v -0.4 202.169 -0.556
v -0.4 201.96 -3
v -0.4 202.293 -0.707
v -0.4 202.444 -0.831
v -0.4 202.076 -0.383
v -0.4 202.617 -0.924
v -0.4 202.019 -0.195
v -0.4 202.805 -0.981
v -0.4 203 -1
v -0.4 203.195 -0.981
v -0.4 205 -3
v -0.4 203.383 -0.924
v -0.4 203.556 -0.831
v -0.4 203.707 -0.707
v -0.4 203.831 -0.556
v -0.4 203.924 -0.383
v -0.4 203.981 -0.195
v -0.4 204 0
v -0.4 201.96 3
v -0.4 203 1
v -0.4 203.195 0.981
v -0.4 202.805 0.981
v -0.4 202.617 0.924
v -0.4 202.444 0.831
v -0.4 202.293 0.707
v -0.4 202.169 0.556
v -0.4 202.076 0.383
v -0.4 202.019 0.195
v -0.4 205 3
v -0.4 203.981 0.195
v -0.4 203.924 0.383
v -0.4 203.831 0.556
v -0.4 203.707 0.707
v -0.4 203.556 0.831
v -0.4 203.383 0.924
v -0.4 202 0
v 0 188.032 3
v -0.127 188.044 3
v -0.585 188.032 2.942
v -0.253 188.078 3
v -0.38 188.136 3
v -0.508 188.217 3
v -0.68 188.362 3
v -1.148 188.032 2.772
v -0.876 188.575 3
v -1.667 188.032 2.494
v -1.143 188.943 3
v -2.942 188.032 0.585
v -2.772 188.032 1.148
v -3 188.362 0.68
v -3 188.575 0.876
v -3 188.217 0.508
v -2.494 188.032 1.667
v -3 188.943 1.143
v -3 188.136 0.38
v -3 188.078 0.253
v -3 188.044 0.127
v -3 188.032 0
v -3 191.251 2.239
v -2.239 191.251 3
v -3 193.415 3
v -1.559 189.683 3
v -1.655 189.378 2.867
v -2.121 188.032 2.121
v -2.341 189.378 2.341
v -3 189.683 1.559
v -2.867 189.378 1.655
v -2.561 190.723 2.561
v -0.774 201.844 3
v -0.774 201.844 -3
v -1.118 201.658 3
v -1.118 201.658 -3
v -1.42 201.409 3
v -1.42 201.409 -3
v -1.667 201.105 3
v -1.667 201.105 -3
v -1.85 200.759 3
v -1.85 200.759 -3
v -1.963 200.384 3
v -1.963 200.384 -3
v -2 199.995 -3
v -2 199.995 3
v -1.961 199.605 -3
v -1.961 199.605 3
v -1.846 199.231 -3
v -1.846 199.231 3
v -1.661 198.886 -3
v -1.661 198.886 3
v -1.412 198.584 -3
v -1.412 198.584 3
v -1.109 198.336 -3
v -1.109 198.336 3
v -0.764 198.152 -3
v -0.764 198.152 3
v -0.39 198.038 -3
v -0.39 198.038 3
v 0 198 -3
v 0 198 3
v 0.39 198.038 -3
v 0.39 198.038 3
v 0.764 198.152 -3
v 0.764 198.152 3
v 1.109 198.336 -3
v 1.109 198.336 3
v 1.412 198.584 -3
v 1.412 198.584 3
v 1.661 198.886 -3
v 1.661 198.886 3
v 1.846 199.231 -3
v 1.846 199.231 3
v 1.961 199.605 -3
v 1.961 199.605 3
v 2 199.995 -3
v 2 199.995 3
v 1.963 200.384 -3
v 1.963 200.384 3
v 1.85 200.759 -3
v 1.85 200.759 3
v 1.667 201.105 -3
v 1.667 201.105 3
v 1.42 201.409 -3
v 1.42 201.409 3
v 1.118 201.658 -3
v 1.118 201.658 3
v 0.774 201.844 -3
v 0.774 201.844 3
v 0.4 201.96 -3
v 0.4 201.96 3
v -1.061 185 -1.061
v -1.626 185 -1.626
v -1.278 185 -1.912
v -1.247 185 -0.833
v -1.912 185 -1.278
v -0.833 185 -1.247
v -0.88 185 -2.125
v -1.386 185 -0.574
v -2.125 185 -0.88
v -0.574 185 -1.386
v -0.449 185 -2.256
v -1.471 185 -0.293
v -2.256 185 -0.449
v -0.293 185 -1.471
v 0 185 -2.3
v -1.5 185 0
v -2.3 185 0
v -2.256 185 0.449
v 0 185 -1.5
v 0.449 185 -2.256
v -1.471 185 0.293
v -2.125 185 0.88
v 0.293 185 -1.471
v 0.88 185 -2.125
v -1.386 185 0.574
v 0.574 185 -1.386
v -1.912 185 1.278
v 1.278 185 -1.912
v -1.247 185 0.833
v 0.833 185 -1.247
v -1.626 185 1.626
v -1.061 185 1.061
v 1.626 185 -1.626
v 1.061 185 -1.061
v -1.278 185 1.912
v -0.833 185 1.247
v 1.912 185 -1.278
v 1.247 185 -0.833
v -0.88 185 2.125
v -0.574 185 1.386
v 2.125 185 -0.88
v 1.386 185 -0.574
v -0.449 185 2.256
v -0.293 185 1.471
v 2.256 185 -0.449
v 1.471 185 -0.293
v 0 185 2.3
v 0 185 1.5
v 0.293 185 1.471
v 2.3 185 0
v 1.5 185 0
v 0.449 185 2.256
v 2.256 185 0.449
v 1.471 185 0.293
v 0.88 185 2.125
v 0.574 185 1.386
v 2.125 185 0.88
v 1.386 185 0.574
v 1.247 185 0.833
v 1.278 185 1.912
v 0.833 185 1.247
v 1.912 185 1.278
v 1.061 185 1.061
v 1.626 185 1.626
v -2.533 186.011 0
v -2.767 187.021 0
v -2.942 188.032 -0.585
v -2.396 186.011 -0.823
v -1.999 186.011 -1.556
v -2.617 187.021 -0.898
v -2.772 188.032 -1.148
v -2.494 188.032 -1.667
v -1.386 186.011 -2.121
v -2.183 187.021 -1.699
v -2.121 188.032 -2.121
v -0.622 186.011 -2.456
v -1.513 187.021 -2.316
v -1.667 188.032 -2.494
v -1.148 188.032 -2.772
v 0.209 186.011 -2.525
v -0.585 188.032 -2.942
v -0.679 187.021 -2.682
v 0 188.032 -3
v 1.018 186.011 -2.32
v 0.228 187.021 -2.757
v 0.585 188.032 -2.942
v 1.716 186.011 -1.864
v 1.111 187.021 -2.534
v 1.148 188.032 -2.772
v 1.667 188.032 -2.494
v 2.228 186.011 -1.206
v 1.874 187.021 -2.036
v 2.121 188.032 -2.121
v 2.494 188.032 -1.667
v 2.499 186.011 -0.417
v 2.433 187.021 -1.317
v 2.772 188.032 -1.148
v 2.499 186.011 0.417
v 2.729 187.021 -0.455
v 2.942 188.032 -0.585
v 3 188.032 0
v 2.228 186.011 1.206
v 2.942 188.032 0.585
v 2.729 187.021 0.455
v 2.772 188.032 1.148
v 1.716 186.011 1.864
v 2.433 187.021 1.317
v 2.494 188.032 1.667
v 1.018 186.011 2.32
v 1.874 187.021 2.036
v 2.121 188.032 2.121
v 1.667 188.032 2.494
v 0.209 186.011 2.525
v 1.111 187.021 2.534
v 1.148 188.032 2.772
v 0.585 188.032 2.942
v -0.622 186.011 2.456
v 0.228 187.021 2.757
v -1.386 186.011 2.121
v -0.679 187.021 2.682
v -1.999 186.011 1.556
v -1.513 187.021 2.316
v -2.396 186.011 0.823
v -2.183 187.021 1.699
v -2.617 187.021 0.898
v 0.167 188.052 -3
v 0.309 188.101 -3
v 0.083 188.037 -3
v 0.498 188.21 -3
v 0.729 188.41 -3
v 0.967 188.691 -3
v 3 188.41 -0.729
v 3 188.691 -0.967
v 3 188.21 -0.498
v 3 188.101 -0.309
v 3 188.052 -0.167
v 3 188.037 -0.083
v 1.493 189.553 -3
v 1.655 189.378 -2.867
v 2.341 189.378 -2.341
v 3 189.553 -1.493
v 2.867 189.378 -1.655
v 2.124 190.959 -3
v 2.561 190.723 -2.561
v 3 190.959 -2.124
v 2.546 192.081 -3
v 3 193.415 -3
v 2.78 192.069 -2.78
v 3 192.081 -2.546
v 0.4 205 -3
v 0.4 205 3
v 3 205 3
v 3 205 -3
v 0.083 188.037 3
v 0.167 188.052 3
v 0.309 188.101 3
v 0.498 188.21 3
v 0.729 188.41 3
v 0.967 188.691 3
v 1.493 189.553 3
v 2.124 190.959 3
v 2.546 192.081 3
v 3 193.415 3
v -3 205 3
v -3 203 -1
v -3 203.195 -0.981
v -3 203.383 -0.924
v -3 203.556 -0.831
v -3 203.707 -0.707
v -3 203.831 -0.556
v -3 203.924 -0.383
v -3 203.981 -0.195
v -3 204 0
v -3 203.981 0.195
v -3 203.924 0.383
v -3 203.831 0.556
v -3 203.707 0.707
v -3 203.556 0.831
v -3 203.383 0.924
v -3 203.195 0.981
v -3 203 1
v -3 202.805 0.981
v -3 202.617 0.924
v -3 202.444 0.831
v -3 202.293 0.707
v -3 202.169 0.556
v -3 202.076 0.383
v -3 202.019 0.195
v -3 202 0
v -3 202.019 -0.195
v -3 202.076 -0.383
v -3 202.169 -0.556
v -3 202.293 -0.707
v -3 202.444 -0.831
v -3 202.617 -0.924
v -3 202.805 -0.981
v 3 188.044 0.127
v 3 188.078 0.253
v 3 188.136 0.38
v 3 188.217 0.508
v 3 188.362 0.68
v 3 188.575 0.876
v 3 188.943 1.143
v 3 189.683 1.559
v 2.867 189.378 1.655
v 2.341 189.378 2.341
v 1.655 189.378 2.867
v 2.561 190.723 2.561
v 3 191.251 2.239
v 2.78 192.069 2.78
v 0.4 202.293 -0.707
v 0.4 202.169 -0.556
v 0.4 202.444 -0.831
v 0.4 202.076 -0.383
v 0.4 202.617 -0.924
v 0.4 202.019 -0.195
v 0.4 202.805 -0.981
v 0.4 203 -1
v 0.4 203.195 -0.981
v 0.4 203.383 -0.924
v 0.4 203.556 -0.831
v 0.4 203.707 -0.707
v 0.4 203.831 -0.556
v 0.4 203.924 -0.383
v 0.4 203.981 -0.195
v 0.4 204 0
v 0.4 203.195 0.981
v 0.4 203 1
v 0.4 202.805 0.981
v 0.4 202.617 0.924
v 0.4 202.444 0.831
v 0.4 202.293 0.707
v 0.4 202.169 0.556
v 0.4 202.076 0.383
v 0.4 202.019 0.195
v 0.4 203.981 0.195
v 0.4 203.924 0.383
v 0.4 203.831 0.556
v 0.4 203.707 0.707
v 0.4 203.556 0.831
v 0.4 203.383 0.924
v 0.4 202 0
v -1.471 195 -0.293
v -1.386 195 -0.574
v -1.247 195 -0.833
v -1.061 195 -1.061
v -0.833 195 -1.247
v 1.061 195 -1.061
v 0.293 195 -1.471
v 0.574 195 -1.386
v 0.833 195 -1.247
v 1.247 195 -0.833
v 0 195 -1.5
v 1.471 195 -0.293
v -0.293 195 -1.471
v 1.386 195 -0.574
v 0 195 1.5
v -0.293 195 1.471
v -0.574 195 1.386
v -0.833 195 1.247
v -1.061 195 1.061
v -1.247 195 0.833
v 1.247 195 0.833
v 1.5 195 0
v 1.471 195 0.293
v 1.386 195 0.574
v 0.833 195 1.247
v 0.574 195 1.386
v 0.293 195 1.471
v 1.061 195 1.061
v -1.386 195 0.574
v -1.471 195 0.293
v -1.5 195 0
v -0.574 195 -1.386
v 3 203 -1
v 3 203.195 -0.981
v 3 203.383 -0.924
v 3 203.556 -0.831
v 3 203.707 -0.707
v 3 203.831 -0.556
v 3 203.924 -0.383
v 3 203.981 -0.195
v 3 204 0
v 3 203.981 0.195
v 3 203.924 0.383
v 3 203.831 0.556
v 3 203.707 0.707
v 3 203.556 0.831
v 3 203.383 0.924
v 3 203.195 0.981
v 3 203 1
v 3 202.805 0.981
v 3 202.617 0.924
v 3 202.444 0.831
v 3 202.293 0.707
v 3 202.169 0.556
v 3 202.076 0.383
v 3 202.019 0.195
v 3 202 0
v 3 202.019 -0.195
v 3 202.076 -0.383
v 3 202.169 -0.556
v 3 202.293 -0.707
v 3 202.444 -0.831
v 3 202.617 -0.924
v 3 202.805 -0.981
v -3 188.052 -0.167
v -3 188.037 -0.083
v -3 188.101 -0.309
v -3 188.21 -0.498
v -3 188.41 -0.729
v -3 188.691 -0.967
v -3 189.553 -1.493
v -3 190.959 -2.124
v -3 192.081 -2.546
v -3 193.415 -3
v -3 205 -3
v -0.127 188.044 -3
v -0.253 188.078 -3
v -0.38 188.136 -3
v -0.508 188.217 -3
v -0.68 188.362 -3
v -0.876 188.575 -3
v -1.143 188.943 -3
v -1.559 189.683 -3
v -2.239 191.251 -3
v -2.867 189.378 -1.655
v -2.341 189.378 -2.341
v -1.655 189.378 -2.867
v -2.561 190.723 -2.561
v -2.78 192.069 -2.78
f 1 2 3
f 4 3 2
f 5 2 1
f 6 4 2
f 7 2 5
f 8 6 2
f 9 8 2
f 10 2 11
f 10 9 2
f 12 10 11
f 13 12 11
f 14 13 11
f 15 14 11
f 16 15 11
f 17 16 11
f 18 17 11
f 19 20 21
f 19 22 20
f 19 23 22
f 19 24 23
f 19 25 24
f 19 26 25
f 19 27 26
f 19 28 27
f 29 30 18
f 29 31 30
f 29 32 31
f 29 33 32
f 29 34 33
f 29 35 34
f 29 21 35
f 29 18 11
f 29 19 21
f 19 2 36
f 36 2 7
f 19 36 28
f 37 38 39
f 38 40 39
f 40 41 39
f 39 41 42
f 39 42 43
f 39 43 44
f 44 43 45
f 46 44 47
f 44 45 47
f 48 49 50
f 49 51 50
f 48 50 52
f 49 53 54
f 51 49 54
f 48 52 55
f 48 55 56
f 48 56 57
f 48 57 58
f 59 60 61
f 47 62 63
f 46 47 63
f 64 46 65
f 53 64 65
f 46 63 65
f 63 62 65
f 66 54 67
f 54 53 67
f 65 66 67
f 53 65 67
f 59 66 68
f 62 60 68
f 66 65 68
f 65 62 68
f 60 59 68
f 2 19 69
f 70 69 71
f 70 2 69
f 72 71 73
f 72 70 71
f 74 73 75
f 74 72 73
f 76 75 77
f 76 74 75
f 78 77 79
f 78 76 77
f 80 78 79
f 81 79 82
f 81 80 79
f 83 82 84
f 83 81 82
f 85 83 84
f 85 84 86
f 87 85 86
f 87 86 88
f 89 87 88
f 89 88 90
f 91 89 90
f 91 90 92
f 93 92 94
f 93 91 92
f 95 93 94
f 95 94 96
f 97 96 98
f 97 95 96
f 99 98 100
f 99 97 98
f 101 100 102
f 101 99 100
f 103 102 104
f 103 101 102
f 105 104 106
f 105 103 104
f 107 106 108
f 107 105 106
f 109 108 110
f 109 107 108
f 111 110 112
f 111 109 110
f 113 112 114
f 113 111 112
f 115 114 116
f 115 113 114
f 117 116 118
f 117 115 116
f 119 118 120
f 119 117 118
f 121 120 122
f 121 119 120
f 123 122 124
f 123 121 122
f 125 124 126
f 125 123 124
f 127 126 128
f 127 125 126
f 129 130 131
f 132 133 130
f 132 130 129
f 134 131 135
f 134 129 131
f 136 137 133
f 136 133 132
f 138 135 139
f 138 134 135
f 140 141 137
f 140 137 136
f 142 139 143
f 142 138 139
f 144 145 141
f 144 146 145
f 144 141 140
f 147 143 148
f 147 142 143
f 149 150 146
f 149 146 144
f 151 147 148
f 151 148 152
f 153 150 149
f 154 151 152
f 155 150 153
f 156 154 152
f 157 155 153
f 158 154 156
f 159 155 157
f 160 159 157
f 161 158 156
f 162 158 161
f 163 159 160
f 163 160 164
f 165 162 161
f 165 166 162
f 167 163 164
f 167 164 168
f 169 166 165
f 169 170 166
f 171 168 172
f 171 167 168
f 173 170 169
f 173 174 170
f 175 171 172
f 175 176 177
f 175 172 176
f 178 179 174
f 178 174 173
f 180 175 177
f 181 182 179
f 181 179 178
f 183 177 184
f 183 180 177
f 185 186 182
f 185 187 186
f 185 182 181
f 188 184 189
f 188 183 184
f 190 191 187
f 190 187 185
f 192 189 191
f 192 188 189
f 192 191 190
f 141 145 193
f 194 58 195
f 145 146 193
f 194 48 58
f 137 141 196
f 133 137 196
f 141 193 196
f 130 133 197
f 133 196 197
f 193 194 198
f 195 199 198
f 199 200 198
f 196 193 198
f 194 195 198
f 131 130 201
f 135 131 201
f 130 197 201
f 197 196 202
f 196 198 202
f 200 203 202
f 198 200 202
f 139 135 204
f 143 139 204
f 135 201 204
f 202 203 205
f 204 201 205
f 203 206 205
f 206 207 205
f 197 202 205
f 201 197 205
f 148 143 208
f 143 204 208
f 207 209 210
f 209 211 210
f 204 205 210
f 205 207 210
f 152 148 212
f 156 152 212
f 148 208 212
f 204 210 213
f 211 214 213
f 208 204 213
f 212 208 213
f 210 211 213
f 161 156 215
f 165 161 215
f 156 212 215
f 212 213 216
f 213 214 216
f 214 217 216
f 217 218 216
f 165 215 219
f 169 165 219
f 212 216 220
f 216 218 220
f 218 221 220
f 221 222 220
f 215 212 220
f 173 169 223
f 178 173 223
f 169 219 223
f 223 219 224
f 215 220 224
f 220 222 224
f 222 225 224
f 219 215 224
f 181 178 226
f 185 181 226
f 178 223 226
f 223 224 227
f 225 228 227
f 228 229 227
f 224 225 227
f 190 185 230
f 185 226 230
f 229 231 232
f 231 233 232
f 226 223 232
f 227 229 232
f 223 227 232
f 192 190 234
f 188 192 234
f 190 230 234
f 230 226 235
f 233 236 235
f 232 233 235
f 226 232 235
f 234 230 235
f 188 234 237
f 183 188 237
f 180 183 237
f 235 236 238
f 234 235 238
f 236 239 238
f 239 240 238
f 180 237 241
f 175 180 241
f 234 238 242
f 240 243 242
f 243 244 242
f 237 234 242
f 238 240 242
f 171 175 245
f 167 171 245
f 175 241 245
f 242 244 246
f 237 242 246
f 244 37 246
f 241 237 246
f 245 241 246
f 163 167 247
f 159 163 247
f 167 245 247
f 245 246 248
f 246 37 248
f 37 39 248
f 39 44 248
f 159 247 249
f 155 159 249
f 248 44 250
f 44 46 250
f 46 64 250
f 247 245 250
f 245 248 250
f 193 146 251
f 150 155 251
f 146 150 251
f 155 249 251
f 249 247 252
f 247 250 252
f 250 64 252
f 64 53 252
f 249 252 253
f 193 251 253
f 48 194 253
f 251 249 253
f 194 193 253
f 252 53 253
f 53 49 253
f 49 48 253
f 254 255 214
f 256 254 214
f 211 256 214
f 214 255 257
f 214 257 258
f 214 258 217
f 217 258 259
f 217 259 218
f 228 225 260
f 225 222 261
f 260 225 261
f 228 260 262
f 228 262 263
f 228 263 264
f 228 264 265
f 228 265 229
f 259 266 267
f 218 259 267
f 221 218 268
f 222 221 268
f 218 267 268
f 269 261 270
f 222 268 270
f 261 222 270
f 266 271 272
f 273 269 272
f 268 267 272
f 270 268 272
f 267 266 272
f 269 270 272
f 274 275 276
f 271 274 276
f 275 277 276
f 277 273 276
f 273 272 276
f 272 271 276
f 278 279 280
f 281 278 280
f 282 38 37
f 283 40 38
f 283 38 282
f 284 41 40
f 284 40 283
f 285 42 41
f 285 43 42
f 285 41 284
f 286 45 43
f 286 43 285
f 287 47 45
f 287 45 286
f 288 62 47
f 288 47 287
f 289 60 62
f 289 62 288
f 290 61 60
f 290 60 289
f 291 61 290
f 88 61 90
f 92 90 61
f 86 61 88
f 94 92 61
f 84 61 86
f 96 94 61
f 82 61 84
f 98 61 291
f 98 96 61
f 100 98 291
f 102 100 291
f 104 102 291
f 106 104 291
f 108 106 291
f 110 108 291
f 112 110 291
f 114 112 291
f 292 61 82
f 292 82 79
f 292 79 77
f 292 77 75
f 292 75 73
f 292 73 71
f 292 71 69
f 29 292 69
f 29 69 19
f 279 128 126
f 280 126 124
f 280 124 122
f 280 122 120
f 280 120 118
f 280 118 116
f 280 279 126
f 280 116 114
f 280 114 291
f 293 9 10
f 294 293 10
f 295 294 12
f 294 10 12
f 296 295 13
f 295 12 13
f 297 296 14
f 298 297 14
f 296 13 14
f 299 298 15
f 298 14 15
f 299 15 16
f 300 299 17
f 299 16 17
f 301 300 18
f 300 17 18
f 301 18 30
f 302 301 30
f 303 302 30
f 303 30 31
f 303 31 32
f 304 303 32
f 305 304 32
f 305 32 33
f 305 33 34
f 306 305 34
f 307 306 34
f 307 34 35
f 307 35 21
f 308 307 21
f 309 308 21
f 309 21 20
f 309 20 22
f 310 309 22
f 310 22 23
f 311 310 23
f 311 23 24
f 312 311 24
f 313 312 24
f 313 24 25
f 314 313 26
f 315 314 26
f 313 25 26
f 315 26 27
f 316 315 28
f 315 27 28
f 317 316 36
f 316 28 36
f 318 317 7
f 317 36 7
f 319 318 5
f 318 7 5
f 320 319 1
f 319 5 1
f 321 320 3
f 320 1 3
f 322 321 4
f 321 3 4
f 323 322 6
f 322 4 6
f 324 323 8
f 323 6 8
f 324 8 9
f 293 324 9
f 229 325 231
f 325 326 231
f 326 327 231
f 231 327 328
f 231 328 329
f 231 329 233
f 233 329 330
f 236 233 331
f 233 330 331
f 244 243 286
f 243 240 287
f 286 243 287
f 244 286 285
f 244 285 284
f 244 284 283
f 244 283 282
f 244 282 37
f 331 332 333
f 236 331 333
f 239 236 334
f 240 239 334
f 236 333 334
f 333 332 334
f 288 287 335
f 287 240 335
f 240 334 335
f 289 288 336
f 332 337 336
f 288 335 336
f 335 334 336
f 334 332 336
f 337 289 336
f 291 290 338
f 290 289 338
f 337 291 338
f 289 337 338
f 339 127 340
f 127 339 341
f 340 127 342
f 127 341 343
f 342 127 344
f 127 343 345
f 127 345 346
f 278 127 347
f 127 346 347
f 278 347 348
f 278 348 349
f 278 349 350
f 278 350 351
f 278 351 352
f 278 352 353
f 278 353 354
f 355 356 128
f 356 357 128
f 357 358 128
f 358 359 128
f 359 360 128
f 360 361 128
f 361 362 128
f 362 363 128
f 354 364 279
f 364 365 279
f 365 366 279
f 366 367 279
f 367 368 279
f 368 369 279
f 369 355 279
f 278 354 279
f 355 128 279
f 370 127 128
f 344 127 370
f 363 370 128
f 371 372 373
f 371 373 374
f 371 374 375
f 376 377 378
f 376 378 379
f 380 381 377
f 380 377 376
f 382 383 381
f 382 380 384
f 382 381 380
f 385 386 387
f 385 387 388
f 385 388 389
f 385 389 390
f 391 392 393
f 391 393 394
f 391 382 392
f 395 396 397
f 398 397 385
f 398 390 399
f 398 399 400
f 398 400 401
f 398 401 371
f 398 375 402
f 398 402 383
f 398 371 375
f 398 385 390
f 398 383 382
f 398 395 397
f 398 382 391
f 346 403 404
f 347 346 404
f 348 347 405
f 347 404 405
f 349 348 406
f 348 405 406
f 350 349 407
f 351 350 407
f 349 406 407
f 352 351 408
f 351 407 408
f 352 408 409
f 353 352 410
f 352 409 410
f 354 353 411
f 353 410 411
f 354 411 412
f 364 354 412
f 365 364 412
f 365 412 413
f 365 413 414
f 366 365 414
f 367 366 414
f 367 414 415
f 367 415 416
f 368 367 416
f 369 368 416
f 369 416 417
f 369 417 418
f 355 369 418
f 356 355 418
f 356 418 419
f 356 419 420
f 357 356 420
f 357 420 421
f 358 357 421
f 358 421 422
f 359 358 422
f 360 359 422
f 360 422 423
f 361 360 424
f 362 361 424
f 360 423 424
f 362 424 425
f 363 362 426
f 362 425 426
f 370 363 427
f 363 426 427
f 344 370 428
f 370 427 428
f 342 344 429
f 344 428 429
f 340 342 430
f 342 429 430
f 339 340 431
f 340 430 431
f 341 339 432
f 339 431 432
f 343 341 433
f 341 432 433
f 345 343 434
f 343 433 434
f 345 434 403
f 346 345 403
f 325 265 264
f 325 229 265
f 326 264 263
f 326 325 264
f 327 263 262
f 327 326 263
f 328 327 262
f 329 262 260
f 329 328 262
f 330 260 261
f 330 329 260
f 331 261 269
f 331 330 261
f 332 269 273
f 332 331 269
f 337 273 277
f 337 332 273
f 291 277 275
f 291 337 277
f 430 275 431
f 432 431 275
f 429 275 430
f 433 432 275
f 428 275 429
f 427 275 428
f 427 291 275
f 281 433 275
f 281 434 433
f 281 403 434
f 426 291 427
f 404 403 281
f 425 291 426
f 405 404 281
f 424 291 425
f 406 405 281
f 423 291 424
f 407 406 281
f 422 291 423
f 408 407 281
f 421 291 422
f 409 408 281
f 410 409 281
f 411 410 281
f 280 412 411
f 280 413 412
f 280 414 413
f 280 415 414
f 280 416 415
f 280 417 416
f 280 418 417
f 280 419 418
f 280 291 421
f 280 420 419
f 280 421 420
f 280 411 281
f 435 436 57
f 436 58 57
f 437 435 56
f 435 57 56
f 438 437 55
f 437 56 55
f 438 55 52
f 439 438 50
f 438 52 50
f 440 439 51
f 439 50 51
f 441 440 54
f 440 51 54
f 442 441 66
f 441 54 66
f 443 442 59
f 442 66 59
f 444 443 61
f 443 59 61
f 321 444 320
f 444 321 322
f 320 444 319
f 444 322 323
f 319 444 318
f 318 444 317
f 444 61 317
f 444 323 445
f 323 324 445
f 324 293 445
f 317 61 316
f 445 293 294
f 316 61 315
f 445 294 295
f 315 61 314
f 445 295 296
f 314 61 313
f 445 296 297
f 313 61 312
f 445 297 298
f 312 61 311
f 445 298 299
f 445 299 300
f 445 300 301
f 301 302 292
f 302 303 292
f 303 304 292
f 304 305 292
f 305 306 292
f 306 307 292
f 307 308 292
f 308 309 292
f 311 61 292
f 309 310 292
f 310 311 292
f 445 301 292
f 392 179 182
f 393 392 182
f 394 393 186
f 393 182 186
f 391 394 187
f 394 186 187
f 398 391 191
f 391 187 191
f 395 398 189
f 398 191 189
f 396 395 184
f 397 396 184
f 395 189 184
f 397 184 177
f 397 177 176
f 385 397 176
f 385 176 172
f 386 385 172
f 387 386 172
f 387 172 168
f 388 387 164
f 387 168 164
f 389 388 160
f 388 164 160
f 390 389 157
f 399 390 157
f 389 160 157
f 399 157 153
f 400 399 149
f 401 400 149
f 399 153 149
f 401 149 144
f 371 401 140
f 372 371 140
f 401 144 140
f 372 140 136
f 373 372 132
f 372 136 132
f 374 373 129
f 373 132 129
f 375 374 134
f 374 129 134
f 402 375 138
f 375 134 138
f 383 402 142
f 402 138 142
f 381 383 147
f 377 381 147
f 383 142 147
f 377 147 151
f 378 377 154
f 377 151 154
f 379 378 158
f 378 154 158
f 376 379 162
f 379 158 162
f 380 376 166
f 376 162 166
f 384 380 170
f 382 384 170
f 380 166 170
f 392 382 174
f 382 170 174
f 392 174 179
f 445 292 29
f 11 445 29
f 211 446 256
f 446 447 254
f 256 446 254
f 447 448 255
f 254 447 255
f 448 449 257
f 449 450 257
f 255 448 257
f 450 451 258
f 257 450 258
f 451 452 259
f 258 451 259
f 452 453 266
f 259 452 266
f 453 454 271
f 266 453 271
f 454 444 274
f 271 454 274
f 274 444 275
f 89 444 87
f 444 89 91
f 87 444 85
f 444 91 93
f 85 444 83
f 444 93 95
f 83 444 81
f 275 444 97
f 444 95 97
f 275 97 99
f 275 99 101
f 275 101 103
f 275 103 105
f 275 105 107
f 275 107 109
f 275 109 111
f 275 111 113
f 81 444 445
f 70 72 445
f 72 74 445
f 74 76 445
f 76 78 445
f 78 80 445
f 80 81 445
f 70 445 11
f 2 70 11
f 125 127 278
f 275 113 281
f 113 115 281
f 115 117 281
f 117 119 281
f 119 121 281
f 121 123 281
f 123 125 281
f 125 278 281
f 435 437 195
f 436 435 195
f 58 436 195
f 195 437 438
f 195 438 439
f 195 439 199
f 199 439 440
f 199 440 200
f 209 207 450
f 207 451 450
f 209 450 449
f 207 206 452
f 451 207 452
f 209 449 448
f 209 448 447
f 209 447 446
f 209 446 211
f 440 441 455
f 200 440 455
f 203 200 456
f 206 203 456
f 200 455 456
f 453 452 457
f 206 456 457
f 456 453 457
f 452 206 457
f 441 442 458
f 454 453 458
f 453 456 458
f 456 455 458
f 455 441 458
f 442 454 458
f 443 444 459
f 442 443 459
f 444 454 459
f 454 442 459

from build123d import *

# Parameters (mm, degrees)
SKETCH1_W           = 6
SKETCH1_H           = 20
SKETCH1_R           = 2
BOSS_EXTRUDE1_DEPTH = 3
SKETCH4_R           = 1.5
CUT_EXTRUDE1_DEPTH  = 10
SKETCH5_W           = 0.8
SKETCH5_H           = 4.49496607
CUT_EXTRUDE2_DEPTH  = 7
SKETCH6_R           = 1
CUT_EXTRUDE3_DEPTH  = 7


with BuildPart() as part:
    # Sketch1 → Boss-Extrude1 (new body, symmetric)
    with BuildSketch(Plane.XY):
        with Locations((0, 195)):
            Rectangle(SKETCH1_W, SKETCH1_H)
        with Locations((0, 200)):
            Circle(SKETCH1_R, mode=Mode.SUBTRACT)
    extrude(amount=BOSS_EXTRUDE1_DEPTH, both=True)

    # Sketch3 → Cut-Revolve3 (revolve, cut)
    with BuildSketch(Plane.XY):
        Polygon((-3, 185), (-2.3, 185), (-3, 188.032033112), (-6.917363823, 205), (-6.917363823, 185), align=None)
    revolve(axis=Axis((0, 200, 0), (0, -1, 0)), mode=Mode.SUBTRACT)

    # Sketch4 → Cut-Extrude1 (cut)
    with BuildSketch(Plane.XZ.offset(-185)):
        Circle(SKETCH4_R)
    extrude(amount=-CUT_EXTRUDE1_DEPTH, mode=Mode.SUBTRACT)

    # Sketch5 → Cut-Extrude2 (cut, through all)
    with BuildSketch(Plane.XY.offset(3)):
        with Locations((0, 202.752516965)):
            Rectangle(SKETCH5_W, SKETCH5_H)
    extrude(amount=-CUT_EXTRUDE2_DEPTH, mode=Mode.SUBTRACT)

    # Sketch6 → Cut-Extrude3 (cut, through all)
    with BuildSketch(Plane(origin=(3, 0, 0), x_dir=(0, 0, -1), z_dir=(1, 0, 0))):
        with Locations((0, 203)):
            Circle(SKETCH6_R)
    extrude(amount=-CUT_EXTRUDE3_DEPTH, mode=Mode.SUBTRACT)


solid = part.part
